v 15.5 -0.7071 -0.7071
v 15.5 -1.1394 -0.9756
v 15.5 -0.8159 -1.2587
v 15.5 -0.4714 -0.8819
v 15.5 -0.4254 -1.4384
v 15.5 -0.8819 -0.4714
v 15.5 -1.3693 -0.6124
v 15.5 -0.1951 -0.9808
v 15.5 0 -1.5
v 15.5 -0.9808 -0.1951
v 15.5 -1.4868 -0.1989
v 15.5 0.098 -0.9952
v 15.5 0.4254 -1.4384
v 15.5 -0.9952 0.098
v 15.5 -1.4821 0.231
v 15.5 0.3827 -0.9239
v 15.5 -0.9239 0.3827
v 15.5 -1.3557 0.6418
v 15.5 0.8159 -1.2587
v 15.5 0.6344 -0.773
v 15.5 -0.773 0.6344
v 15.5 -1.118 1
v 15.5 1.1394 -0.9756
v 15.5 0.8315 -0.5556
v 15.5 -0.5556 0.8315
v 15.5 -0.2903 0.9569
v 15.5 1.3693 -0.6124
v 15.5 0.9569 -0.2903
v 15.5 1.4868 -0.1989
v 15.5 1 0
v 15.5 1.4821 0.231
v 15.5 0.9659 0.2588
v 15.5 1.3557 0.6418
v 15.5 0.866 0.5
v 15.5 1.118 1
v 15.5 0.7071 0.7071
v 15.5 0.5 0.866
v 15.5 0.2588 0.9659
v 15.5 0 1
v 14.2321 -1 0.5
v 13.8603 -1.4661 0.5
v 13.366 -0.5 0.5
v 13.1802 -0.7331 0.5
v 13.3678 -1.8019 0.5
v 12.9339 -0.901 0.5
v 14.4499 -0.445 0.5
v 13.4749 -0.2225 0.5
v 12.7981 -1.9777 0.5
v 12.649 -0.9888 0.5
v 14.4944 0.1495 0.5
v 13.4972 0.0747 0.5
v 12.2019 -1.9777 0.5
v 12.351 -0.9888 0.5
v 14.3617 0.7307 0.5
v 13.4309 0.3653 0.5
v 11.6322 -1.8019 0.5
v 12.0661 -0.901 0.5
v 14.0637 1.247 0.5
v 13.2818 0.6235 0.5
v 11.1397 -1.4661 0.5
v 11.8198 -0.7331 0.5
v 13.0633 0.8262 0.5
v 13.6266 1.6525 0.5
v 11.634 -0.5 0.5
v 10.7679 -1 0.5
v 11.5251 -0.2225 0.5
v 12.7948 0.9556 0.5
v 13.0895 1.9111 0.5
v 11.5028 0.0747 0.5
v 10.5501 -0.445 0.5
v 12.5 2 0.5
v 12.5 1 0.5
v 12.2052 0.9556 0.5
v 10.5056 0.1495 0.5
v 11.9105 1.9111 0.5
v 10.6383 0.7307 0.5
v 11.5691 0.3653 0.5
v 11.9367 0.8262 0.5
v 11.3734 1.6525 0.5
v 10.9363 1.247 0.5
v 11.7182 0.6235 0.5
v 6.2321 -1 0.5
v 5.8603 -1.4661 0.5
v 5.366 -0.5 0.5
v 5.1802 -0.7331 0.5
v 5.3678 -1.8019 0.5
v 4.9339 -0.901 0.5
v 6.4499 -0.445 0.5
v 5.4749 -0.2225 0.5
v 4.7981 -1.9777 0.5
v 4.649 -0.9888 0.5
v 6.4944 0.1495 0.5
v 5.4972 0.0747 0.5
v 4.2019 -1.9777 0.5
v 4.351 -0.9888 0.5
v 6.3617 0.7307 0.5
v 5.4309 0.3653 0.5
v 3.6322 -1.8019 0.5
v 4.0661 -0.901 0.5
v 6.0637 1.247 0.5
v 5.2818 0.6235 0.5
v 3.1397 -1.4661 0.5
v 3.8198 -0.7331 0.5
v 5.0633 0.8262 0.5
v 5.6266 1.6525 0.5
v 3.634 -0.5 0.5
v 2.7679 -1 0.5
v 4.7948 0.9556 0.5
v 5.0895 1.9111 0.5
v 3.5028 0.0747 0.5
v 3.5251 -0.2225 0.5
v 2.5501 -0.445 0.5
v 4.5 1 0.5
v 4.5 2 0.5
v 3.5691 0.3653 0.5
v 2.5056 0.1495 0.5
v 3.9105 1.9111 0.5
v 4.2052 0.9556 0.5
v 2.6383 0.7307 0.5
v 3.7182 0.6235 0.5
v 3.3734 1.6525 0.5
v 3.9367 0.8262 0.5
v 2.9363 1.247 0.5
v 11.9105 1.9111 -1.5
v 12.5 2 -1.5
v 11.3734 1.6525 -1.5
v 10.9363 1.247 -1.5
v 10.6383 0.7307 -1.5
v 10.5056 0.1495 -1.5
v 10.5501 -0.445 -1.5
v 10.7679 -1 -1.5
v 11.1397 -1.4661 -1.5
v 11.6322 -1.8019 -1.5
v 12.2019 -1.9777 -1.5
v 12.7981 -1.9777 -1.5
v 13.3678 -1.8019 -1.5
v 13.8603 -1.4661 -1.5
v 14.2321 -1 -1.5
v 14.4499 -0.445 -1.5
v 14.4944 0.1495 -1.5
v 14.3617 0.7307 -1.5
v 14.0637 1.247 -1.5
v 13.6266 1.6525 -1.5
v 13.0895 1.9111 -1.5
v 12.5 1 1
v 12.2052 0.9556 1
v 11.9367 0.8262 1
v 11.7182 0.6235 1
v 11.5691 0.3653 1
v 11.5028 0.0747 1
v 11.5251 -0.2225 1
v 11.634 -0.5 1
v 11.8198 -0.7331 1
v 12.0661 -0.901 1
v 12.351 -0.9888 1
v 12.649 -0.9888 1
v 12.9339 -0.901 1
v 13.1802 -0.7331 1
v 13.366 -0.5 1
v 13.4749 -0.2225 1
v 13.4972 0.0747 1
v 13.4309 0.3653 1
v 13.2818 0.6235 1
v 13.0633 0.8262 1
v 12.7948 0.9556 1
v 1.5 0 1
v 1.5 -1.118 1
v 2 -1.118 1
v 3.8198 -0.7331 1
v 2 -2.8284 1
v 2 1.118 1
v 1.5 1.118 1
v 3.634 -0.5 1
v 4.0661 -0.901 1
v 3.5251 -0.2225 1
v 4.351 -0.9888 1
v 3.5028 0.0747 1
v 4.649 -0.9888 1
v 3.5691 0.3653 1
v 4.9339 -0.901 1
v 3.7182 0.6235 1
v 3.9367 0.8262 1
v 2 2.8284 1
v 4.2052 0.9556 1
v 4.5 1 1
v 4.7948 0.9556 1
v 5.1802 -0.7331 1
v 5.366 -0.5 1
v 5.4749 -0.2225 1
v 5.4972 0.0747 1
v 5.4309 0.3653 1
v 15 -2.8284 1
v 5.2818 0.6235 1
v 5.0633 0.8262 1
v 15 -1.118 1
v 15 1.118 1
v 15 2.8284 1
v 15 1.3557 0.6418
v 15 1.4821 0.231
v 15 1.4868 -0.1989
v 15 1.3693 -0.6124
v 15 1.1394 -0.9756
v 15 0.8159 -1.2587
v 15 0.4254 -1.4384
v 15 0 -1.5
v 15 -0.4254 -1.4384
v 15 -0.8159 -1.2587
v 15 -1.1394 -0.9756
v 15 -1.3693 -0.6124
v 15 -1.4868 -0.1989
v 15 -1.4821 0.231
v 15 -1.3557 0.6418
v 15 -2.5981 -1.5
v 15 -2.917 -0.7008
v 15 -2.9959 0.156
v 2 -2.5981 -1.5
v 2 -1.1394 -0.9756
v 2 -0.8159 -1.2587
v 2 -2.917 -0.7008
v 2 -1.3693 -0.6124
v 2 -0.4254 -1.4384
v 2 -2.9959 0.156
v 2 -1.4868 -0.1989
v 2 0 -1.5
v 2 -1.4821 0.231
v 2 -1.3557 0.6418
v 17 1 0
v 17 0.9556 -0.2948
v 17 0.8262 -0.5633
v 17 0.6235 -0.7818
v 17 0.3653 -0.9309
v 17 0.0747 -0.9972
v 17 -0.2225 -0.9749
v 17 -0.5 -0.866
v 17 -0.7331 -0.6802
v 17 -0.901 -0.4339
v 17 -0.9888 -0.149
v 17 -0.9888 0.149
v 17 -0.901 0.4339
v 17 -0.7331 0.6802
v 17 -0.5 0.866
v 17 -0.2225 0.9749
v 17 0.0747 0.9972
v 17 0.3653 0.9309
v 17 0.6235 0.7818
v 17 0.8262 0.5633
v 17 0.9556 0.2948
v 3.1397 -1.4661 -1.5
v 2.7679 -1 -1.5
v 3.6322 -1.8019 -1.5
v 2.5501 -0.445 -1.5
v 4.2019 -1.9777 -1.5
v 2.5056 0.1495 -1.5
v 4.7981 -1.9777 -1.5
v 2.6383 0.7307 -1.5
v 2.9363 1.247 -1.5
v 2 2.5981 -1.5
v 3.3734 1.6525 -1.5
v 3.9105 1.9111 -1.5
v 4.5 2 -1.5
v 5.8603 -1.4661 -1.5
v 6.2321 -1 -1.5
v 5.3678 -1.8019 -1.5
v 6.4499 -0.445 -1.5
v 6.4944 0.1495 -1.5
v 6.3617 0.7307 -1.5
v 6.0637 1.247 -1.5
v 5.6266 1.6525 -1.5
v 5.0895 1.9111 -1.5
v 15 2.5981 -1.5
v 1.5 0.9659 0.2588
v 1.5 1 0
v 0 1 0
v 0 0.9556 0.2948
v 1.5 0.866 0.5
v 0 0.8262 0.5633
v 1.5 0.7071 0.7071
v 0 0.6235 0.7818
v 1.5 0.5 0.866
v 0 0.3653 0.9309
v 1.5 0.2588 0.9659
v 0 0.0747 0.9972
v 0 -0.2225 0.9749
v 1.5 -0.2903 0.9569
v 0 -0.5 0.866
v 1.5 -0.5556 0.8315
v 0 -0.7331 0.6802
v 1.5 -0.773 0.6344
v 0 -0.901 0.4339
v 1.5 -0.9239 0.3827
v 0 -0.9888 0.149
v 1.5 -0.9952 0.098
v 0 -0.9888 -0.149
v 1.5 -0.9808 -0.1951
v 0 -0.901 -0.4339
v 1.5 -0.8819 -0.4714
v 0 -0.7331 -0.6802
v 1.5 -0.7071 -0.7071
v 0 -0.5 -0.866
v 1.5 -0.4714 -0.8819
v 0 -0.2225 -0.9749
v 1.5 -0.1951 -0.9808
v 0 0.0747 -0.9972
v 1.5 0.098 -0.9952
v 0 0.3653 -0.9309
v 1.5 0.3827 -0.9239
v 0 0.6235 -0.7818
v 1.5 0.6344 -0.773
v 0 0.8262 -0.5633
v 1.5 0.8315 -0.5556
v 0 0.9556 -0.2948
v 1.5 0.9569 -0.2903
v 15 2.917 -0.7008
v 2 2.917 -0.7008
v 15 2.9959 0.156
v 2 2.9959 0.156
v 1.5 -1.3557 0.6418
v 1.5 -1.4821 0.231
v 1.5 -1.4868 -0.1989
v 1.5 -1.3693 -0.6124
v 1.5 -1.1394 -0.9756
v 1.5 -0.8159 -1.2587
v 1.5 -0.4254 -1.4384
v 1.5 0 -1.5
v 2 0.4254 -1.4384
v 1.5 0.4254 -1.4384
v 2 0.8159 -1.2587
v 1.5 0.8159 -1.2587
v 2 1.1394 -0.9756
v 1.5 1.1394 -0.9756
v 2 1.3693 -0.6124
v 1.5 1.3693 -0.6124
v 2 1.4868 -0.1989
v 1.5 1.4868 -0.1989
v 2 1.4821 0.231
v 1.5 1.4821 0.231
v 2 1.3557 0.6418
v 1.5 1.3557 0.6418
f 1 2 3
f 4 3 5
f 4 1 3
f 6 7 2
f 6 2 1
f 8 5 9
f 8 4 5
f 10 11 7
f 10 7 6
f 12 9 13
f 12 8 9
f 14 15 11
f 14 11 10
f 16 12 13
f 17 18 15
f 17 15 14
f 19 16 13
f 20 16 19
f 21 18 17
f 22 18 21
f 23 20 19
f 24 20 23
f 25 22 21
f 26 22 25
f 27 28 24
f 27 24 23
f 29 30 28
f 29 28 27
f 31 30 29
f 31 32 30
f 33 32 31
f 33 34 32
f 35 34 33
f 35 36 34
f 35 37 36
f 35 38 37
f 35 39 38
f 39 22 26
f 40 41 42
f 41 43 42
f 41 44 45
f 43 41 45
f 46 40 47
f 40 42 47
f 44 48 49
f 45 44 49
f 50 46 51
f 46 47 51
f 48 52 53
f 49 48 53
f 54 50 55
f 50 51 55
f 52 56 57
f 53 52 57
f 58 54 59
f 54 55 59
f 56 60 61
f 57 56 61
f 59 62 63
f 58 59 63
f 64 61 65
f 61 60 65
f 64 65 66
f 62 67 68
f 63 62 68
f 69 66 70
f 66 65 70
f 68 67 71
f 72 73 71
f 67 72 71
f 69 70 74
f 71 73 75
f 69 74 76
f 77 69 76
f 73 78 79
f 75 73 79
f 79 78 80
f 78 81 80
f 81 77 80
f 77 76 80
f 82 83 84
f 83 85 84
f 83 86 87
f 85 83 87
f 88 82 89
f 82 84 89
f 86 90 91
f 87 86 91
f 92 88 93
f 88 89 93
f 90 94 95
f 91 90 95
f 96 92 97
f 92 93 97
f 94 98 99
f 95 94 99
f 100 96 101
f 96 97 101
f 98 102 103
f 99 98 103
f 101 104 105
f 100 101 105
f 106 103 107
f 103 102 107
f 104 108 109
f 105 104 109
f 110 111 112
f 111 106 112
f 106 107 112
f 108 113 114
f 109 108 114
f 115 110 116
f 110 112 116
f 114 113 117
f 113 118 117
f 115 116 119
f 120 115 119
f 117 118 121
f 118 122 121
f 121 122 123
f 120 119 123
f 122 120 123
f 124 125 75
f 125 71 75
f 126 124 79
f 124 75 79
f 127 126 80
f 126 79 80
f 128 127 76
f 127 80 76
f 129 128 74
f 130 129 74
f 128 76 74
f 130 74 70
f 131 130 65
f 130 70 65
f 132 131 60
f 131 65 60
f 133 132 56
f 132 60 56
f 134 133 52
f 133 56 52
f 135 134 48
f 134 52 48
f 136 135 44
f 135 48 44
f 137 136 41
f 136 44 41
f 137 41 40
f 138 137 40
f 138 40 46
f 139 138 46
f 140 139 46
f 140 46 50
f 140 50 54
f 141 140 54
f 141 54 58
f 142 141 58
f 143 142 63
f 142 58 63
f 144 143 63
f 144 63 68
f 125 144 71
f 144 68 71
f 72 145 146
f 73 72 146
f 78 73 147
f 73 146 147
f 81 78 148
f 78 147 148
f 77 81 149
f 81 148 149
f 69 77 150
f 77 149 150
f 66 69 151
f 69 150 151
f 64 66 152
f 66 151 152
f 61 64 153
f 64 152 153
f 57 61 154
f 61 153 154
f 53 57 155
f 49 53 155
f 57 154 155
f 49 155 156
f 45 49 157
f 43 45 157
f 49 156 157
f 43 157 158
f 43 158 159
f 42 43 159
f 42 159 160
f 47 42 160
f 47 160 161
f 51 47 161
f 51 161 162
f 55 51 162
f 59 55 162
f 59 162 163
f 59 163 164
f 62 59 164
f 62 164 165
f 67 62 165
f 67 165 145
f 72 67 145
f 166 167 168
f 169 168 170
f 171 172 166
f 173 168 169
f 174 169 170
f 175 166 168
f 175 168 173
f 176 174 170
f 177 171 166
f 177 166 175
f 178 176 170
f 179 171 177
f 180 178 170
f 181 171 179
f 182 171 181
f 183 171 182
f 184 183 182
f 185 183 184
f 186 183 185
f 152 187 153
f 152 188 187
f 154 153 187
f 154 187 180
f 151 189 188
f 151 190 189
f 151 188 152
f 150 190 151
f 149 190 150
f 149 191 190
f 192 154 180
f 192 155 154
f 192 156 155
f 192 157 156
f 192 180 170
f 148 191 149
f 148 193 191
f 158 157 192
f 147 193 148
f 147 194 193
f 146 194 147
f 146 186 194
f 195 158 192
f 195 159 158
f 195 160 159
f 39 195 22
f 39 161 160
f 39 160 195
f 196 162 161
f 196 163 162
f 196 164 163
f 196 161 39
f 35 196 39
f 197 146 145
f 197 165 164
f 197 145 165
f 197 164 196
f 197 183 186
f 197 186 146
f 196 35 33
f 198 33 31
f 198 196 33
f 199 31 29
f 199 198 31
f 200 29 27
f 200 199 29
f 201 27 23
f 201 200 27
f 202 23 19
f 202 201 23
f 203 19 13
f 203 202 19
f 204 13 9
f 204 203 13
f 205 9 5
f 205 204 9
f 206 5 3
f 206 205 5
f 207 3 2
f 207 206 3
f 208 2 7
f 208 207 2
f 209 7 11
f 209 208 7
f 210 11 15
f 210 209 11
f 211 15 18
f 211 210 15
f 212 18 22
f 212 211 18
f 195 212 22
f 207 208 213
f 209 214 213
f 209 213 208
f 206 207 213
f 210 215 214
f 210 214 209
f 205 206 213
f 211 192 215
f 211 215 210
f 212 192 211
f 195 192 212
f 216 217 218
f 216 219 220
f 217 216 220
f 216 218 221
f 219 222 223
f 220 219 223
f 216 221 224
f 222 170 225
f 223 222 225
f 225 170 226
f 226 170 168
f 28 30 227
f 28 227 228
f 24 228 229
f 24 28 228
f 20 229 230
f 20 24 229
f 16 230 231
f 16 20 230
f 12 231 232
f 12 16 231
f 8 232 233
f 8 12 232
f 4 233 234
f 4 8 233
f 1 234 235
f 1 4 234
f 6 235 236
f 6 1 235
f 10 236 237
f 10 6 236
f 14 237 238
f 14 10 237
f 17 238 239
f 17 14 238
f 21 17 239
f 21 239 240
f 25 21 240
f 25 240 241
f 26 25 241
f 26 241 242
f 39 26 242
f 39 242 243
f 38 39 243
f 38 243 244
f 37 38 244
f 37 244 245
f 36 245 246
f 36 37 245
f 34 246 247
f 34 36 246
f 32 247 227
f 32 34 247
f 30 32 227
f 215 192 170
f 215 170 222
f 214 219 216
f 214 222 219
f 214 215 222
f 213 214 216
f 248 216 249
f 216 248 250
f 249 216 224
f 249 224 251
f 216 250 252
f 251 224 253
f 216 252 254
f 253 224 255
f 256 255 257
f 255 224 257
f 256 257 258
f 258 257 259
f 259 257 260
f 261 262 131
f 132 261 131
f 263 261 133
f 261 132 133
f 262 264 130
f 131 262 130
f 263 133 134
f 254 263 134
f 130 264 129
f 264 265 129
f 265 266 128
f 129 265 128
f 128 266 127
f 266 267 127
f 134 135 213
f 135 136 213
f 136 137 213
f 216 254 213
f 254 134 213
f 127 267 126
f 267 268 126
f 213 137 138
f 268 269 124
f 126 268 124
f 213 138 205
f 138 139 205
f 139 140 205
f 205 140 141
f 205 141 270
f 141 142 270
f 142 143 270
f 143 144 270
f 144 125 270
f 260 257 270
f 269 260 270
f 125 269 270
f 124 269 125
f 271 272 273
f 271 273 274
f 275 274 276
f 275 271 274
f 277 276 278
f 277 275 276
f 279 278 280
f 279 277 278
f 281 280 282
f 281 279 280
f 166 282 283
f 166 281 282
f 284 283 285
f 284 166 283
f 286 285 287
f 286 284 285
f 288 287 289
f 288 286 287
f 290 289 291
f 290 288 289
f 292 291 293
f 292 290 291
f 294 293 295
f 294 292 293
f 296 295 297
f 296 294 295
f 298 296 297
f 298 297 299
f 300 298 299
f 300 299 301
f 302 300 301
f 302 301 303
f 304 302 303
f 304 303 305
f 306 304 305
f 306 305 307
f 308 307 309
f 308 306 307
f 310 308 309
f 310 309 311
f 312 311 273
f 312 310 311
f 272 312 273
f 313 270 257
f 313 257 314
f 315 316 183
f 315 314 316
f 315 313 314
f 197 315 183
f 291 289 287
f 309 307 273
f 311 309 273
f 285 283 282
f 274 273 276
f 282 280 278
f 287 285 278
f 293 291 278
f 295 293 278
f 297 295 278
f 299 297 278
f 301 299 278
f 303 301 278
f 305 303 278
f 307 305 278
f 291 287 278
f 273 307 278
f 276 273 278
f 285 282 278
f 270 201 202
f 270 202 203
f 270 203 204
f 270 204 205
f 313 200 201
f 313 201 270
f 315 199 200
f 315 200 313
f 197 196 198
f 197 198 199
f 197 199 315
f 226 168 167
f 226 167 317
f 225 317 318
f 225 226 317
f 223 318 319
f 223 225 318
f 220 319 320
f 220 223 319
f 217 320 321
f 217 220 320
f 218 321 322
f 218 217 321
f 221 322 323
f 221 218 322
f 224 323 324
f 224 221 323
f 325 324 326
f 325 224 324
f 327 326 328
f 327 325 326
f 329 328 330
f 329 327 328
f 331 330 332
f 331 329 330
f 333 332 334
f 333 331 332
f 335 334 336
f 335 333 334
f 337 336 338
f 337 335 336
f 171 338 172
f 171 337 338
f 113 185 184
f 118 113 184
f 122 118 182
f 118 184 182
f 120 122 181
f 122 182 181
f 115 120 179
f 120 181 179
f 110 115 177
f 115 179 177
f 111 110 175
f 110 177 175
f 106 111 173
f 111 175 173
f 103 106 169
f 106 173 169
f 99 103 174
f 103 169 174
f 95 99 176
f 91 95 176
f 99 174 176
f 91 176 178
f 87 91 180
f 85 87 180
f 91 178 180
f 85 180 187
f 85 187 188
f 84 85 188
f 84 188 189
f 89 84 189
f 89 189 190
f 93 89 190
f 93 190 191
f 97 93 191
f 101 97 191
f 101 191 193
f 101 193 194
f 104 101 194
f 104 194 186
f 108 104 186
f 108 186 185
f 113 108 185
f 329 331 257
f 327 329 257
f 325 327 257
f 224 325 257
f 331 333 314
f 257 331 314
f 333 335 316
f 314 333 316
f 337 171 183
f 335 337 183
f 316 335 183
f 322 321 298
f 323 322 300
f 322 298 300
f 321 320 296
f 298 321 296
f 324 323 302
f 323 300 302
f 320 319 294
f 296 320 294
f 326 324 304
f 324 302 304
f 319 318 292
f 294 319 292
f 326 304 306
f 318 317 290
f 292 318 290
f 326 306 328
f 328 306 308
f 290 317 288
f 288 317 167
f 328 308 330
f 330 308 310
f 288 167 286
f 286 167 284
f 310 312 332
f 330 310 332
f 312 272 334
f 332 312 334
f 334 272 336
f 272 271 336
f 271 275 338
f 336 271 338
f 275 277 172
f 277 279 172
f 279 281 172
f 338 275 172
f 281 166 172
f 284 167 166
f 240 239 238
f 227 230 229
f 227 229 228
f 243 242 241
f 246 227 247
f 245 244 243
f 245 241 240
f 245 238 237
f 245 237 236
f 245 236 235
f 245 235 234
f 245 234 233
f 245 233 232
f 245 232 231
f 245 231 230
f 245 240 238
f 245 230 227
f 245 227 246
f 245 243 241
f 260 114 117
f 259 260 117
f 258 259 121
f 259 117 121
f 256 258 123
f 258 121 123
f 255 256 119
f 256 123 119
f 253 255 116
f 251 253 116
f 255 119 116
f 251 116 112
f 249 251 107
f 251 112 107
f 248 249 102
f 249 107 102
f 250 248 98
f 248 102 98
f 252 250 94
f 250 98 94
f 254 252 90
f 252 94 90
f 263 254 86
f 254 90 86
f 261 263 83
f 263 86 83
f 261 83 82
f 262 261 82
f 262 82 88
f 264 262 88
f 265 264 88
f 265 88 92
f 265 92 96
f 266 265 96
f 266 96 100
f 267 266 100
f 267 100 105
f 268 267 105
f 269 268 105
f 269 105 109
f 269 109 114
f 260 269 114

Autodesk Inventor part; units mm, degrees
ref_plane "YZ Plane" through (0, 0, 0) normal (1, 0, 0) x (0, 1, 0)
ref_plane "XZ Plane" through (0, 0, 0) normal (0, 1, 0) x (-1, 0, 0)
sketch "Sketch1" plane through (0, 0, 0) normal (0, 0, 1) x (1, 0, 0)
  line L0 (0, 0) -> (8.5, 0)
  line L1 (0, 0) -> (0, 1)
  line L2 (0, 1) -> (1.5, 1)
  line L3 (1.5, 1) -> (1.5, 1.5)
  line L4 (1.5, 1.5) -> (2, 1.5)
  line L5 (2, 1.5) -> (2, 3)
  line L6 (8.5, 0) -> (8.5, 8.9525) construction
  line L7 (2, 3) -> (8.5, 3)
  line L8 (17, 0) -> (8.5, 0)
  line L9 (17, 0) -> (17, 1)
  line L10 (17, 1) -> (15.5, 1)
  line L11 (15.5, 1) -> (15.5, 1.5)
  line L12 (15.5, 1.5) -> (15, 1.5)
  line L13 (15, 1.5) -> (15, 3)
  line L14 (15, 3) -> (8.5, 3)
  dimension "d0" = 7
  dimension "d1" = 1
  dimension "d2" = 1.5
  dimension "d3" = 1.5
  dimension "d4" = 3
  dimension "d5" = 0.5
revolve "Revolution1" add sketch "Sketch1" angle 360 about axis through (0, 0, 0) along (1, 0, 0)
ref_plane "Work Plane1" through (0.75, 0, 1) normal (0, 0, 1) x (1, 0, 0)
sketch "Sketch2" plane through (0.75, 0, 1) normal (0, 0, 1) x (1, 0, 0)
  line L0 (1.25, -3) -> (1.25, 3) projected
  line L1 (14.25, -3) -> (14.25, 3) projected
  line L2 (0.75, -1.5) -> (0.75, 1.5) projected
  line L3 (1.25, -1.5) -> (1.25, 1.5) projected
  line L4 (14.25, -1.5) -> (14.25, 1.5) projected
  line L5 (14.75, -1.5) -> (14.75, 1.5) projected
  line L6 (0.75, 1.5) -> (1.25, 1.5) projected
  line L7 (0.75, -1.5) -> (1.25, -1.5) projected
  line L8 (14.25, 1.5) -> (14.75, 1.5) projected
  line L9 (14.25, -1.5) -> (14.75, -1.5) projected
  line L10 (1.25, -3) -> (14.25, -3) projected
  line L11 (1.25, 3) -> (14.25, 3) projected
  point P0 (-0.75, 0)
extrude "Extrusion1" cut sketch "Sketch2" along normal through all
ref_plane "Work Plane2" through (1.75, 0, -1.5) normal (0, 0, 1) x (1, 0, 0)
sketch "Sketch3" plane through (1.75, 0, -1.5) normal (0, 0, 1) x (1, 0, 0)
  line L0 (0.25, 3) -> (13.25, 3) projected
  line L1 (13.25, -3) -> (13.25, 3) projected
  line L2 (0.25, -3) -> (0.25, 3) projected
  line L3 (0.25, -3) -> (13.25, -3) projected
  point P0 (-1.75, 0)
  point P1 (13.25, -2.8284)
  point P2 (13.25, 2.8284)
  point P3 (0.25, -2.8284)
  point P4 (0.25, 2.8284)
extrude "Extrusion2" cut sketch "Sketch3" against normal through all
sketch "Sketch4" plane through (1.75, 0, -1.5) normal (0, 0, 1) x (1, 0, 0)
  line L0 (15.25, -1) -> (15.25, 1) projected
  line L1 (15.25, 0) -> (-1.75, 0) construction
  line L2 (6.75, 0) -> (6.75, 2.8511) construction
  line L3 (-1.75, 0) -> (15.25, 0) construction
  point P0 (10.75, 0)
  point P1 (2.75, 0)
  dimension "d11" = 8
hole "Hole1" at (12.5, 0, -1.5) at (4.5, 0, -1.5) direction (0, 0, 1) diameter 2 end through all counterbore diameter 4 counterbore depth 2
equation "\"d0\" = 0.5 * finger_inner_width"
equation "\"d4\" = 0.5 * finger_shaft_diameter"
equation "\"d11\" = finger_mounting_screw_distance"
equation "\"finger_mounting_screw_distance\" = 8"
equation "\"finger_shaft_diameter\" = 6"
equation "\"finger_inner_width\" = 14"
properties part number "0th_finger_mount"
